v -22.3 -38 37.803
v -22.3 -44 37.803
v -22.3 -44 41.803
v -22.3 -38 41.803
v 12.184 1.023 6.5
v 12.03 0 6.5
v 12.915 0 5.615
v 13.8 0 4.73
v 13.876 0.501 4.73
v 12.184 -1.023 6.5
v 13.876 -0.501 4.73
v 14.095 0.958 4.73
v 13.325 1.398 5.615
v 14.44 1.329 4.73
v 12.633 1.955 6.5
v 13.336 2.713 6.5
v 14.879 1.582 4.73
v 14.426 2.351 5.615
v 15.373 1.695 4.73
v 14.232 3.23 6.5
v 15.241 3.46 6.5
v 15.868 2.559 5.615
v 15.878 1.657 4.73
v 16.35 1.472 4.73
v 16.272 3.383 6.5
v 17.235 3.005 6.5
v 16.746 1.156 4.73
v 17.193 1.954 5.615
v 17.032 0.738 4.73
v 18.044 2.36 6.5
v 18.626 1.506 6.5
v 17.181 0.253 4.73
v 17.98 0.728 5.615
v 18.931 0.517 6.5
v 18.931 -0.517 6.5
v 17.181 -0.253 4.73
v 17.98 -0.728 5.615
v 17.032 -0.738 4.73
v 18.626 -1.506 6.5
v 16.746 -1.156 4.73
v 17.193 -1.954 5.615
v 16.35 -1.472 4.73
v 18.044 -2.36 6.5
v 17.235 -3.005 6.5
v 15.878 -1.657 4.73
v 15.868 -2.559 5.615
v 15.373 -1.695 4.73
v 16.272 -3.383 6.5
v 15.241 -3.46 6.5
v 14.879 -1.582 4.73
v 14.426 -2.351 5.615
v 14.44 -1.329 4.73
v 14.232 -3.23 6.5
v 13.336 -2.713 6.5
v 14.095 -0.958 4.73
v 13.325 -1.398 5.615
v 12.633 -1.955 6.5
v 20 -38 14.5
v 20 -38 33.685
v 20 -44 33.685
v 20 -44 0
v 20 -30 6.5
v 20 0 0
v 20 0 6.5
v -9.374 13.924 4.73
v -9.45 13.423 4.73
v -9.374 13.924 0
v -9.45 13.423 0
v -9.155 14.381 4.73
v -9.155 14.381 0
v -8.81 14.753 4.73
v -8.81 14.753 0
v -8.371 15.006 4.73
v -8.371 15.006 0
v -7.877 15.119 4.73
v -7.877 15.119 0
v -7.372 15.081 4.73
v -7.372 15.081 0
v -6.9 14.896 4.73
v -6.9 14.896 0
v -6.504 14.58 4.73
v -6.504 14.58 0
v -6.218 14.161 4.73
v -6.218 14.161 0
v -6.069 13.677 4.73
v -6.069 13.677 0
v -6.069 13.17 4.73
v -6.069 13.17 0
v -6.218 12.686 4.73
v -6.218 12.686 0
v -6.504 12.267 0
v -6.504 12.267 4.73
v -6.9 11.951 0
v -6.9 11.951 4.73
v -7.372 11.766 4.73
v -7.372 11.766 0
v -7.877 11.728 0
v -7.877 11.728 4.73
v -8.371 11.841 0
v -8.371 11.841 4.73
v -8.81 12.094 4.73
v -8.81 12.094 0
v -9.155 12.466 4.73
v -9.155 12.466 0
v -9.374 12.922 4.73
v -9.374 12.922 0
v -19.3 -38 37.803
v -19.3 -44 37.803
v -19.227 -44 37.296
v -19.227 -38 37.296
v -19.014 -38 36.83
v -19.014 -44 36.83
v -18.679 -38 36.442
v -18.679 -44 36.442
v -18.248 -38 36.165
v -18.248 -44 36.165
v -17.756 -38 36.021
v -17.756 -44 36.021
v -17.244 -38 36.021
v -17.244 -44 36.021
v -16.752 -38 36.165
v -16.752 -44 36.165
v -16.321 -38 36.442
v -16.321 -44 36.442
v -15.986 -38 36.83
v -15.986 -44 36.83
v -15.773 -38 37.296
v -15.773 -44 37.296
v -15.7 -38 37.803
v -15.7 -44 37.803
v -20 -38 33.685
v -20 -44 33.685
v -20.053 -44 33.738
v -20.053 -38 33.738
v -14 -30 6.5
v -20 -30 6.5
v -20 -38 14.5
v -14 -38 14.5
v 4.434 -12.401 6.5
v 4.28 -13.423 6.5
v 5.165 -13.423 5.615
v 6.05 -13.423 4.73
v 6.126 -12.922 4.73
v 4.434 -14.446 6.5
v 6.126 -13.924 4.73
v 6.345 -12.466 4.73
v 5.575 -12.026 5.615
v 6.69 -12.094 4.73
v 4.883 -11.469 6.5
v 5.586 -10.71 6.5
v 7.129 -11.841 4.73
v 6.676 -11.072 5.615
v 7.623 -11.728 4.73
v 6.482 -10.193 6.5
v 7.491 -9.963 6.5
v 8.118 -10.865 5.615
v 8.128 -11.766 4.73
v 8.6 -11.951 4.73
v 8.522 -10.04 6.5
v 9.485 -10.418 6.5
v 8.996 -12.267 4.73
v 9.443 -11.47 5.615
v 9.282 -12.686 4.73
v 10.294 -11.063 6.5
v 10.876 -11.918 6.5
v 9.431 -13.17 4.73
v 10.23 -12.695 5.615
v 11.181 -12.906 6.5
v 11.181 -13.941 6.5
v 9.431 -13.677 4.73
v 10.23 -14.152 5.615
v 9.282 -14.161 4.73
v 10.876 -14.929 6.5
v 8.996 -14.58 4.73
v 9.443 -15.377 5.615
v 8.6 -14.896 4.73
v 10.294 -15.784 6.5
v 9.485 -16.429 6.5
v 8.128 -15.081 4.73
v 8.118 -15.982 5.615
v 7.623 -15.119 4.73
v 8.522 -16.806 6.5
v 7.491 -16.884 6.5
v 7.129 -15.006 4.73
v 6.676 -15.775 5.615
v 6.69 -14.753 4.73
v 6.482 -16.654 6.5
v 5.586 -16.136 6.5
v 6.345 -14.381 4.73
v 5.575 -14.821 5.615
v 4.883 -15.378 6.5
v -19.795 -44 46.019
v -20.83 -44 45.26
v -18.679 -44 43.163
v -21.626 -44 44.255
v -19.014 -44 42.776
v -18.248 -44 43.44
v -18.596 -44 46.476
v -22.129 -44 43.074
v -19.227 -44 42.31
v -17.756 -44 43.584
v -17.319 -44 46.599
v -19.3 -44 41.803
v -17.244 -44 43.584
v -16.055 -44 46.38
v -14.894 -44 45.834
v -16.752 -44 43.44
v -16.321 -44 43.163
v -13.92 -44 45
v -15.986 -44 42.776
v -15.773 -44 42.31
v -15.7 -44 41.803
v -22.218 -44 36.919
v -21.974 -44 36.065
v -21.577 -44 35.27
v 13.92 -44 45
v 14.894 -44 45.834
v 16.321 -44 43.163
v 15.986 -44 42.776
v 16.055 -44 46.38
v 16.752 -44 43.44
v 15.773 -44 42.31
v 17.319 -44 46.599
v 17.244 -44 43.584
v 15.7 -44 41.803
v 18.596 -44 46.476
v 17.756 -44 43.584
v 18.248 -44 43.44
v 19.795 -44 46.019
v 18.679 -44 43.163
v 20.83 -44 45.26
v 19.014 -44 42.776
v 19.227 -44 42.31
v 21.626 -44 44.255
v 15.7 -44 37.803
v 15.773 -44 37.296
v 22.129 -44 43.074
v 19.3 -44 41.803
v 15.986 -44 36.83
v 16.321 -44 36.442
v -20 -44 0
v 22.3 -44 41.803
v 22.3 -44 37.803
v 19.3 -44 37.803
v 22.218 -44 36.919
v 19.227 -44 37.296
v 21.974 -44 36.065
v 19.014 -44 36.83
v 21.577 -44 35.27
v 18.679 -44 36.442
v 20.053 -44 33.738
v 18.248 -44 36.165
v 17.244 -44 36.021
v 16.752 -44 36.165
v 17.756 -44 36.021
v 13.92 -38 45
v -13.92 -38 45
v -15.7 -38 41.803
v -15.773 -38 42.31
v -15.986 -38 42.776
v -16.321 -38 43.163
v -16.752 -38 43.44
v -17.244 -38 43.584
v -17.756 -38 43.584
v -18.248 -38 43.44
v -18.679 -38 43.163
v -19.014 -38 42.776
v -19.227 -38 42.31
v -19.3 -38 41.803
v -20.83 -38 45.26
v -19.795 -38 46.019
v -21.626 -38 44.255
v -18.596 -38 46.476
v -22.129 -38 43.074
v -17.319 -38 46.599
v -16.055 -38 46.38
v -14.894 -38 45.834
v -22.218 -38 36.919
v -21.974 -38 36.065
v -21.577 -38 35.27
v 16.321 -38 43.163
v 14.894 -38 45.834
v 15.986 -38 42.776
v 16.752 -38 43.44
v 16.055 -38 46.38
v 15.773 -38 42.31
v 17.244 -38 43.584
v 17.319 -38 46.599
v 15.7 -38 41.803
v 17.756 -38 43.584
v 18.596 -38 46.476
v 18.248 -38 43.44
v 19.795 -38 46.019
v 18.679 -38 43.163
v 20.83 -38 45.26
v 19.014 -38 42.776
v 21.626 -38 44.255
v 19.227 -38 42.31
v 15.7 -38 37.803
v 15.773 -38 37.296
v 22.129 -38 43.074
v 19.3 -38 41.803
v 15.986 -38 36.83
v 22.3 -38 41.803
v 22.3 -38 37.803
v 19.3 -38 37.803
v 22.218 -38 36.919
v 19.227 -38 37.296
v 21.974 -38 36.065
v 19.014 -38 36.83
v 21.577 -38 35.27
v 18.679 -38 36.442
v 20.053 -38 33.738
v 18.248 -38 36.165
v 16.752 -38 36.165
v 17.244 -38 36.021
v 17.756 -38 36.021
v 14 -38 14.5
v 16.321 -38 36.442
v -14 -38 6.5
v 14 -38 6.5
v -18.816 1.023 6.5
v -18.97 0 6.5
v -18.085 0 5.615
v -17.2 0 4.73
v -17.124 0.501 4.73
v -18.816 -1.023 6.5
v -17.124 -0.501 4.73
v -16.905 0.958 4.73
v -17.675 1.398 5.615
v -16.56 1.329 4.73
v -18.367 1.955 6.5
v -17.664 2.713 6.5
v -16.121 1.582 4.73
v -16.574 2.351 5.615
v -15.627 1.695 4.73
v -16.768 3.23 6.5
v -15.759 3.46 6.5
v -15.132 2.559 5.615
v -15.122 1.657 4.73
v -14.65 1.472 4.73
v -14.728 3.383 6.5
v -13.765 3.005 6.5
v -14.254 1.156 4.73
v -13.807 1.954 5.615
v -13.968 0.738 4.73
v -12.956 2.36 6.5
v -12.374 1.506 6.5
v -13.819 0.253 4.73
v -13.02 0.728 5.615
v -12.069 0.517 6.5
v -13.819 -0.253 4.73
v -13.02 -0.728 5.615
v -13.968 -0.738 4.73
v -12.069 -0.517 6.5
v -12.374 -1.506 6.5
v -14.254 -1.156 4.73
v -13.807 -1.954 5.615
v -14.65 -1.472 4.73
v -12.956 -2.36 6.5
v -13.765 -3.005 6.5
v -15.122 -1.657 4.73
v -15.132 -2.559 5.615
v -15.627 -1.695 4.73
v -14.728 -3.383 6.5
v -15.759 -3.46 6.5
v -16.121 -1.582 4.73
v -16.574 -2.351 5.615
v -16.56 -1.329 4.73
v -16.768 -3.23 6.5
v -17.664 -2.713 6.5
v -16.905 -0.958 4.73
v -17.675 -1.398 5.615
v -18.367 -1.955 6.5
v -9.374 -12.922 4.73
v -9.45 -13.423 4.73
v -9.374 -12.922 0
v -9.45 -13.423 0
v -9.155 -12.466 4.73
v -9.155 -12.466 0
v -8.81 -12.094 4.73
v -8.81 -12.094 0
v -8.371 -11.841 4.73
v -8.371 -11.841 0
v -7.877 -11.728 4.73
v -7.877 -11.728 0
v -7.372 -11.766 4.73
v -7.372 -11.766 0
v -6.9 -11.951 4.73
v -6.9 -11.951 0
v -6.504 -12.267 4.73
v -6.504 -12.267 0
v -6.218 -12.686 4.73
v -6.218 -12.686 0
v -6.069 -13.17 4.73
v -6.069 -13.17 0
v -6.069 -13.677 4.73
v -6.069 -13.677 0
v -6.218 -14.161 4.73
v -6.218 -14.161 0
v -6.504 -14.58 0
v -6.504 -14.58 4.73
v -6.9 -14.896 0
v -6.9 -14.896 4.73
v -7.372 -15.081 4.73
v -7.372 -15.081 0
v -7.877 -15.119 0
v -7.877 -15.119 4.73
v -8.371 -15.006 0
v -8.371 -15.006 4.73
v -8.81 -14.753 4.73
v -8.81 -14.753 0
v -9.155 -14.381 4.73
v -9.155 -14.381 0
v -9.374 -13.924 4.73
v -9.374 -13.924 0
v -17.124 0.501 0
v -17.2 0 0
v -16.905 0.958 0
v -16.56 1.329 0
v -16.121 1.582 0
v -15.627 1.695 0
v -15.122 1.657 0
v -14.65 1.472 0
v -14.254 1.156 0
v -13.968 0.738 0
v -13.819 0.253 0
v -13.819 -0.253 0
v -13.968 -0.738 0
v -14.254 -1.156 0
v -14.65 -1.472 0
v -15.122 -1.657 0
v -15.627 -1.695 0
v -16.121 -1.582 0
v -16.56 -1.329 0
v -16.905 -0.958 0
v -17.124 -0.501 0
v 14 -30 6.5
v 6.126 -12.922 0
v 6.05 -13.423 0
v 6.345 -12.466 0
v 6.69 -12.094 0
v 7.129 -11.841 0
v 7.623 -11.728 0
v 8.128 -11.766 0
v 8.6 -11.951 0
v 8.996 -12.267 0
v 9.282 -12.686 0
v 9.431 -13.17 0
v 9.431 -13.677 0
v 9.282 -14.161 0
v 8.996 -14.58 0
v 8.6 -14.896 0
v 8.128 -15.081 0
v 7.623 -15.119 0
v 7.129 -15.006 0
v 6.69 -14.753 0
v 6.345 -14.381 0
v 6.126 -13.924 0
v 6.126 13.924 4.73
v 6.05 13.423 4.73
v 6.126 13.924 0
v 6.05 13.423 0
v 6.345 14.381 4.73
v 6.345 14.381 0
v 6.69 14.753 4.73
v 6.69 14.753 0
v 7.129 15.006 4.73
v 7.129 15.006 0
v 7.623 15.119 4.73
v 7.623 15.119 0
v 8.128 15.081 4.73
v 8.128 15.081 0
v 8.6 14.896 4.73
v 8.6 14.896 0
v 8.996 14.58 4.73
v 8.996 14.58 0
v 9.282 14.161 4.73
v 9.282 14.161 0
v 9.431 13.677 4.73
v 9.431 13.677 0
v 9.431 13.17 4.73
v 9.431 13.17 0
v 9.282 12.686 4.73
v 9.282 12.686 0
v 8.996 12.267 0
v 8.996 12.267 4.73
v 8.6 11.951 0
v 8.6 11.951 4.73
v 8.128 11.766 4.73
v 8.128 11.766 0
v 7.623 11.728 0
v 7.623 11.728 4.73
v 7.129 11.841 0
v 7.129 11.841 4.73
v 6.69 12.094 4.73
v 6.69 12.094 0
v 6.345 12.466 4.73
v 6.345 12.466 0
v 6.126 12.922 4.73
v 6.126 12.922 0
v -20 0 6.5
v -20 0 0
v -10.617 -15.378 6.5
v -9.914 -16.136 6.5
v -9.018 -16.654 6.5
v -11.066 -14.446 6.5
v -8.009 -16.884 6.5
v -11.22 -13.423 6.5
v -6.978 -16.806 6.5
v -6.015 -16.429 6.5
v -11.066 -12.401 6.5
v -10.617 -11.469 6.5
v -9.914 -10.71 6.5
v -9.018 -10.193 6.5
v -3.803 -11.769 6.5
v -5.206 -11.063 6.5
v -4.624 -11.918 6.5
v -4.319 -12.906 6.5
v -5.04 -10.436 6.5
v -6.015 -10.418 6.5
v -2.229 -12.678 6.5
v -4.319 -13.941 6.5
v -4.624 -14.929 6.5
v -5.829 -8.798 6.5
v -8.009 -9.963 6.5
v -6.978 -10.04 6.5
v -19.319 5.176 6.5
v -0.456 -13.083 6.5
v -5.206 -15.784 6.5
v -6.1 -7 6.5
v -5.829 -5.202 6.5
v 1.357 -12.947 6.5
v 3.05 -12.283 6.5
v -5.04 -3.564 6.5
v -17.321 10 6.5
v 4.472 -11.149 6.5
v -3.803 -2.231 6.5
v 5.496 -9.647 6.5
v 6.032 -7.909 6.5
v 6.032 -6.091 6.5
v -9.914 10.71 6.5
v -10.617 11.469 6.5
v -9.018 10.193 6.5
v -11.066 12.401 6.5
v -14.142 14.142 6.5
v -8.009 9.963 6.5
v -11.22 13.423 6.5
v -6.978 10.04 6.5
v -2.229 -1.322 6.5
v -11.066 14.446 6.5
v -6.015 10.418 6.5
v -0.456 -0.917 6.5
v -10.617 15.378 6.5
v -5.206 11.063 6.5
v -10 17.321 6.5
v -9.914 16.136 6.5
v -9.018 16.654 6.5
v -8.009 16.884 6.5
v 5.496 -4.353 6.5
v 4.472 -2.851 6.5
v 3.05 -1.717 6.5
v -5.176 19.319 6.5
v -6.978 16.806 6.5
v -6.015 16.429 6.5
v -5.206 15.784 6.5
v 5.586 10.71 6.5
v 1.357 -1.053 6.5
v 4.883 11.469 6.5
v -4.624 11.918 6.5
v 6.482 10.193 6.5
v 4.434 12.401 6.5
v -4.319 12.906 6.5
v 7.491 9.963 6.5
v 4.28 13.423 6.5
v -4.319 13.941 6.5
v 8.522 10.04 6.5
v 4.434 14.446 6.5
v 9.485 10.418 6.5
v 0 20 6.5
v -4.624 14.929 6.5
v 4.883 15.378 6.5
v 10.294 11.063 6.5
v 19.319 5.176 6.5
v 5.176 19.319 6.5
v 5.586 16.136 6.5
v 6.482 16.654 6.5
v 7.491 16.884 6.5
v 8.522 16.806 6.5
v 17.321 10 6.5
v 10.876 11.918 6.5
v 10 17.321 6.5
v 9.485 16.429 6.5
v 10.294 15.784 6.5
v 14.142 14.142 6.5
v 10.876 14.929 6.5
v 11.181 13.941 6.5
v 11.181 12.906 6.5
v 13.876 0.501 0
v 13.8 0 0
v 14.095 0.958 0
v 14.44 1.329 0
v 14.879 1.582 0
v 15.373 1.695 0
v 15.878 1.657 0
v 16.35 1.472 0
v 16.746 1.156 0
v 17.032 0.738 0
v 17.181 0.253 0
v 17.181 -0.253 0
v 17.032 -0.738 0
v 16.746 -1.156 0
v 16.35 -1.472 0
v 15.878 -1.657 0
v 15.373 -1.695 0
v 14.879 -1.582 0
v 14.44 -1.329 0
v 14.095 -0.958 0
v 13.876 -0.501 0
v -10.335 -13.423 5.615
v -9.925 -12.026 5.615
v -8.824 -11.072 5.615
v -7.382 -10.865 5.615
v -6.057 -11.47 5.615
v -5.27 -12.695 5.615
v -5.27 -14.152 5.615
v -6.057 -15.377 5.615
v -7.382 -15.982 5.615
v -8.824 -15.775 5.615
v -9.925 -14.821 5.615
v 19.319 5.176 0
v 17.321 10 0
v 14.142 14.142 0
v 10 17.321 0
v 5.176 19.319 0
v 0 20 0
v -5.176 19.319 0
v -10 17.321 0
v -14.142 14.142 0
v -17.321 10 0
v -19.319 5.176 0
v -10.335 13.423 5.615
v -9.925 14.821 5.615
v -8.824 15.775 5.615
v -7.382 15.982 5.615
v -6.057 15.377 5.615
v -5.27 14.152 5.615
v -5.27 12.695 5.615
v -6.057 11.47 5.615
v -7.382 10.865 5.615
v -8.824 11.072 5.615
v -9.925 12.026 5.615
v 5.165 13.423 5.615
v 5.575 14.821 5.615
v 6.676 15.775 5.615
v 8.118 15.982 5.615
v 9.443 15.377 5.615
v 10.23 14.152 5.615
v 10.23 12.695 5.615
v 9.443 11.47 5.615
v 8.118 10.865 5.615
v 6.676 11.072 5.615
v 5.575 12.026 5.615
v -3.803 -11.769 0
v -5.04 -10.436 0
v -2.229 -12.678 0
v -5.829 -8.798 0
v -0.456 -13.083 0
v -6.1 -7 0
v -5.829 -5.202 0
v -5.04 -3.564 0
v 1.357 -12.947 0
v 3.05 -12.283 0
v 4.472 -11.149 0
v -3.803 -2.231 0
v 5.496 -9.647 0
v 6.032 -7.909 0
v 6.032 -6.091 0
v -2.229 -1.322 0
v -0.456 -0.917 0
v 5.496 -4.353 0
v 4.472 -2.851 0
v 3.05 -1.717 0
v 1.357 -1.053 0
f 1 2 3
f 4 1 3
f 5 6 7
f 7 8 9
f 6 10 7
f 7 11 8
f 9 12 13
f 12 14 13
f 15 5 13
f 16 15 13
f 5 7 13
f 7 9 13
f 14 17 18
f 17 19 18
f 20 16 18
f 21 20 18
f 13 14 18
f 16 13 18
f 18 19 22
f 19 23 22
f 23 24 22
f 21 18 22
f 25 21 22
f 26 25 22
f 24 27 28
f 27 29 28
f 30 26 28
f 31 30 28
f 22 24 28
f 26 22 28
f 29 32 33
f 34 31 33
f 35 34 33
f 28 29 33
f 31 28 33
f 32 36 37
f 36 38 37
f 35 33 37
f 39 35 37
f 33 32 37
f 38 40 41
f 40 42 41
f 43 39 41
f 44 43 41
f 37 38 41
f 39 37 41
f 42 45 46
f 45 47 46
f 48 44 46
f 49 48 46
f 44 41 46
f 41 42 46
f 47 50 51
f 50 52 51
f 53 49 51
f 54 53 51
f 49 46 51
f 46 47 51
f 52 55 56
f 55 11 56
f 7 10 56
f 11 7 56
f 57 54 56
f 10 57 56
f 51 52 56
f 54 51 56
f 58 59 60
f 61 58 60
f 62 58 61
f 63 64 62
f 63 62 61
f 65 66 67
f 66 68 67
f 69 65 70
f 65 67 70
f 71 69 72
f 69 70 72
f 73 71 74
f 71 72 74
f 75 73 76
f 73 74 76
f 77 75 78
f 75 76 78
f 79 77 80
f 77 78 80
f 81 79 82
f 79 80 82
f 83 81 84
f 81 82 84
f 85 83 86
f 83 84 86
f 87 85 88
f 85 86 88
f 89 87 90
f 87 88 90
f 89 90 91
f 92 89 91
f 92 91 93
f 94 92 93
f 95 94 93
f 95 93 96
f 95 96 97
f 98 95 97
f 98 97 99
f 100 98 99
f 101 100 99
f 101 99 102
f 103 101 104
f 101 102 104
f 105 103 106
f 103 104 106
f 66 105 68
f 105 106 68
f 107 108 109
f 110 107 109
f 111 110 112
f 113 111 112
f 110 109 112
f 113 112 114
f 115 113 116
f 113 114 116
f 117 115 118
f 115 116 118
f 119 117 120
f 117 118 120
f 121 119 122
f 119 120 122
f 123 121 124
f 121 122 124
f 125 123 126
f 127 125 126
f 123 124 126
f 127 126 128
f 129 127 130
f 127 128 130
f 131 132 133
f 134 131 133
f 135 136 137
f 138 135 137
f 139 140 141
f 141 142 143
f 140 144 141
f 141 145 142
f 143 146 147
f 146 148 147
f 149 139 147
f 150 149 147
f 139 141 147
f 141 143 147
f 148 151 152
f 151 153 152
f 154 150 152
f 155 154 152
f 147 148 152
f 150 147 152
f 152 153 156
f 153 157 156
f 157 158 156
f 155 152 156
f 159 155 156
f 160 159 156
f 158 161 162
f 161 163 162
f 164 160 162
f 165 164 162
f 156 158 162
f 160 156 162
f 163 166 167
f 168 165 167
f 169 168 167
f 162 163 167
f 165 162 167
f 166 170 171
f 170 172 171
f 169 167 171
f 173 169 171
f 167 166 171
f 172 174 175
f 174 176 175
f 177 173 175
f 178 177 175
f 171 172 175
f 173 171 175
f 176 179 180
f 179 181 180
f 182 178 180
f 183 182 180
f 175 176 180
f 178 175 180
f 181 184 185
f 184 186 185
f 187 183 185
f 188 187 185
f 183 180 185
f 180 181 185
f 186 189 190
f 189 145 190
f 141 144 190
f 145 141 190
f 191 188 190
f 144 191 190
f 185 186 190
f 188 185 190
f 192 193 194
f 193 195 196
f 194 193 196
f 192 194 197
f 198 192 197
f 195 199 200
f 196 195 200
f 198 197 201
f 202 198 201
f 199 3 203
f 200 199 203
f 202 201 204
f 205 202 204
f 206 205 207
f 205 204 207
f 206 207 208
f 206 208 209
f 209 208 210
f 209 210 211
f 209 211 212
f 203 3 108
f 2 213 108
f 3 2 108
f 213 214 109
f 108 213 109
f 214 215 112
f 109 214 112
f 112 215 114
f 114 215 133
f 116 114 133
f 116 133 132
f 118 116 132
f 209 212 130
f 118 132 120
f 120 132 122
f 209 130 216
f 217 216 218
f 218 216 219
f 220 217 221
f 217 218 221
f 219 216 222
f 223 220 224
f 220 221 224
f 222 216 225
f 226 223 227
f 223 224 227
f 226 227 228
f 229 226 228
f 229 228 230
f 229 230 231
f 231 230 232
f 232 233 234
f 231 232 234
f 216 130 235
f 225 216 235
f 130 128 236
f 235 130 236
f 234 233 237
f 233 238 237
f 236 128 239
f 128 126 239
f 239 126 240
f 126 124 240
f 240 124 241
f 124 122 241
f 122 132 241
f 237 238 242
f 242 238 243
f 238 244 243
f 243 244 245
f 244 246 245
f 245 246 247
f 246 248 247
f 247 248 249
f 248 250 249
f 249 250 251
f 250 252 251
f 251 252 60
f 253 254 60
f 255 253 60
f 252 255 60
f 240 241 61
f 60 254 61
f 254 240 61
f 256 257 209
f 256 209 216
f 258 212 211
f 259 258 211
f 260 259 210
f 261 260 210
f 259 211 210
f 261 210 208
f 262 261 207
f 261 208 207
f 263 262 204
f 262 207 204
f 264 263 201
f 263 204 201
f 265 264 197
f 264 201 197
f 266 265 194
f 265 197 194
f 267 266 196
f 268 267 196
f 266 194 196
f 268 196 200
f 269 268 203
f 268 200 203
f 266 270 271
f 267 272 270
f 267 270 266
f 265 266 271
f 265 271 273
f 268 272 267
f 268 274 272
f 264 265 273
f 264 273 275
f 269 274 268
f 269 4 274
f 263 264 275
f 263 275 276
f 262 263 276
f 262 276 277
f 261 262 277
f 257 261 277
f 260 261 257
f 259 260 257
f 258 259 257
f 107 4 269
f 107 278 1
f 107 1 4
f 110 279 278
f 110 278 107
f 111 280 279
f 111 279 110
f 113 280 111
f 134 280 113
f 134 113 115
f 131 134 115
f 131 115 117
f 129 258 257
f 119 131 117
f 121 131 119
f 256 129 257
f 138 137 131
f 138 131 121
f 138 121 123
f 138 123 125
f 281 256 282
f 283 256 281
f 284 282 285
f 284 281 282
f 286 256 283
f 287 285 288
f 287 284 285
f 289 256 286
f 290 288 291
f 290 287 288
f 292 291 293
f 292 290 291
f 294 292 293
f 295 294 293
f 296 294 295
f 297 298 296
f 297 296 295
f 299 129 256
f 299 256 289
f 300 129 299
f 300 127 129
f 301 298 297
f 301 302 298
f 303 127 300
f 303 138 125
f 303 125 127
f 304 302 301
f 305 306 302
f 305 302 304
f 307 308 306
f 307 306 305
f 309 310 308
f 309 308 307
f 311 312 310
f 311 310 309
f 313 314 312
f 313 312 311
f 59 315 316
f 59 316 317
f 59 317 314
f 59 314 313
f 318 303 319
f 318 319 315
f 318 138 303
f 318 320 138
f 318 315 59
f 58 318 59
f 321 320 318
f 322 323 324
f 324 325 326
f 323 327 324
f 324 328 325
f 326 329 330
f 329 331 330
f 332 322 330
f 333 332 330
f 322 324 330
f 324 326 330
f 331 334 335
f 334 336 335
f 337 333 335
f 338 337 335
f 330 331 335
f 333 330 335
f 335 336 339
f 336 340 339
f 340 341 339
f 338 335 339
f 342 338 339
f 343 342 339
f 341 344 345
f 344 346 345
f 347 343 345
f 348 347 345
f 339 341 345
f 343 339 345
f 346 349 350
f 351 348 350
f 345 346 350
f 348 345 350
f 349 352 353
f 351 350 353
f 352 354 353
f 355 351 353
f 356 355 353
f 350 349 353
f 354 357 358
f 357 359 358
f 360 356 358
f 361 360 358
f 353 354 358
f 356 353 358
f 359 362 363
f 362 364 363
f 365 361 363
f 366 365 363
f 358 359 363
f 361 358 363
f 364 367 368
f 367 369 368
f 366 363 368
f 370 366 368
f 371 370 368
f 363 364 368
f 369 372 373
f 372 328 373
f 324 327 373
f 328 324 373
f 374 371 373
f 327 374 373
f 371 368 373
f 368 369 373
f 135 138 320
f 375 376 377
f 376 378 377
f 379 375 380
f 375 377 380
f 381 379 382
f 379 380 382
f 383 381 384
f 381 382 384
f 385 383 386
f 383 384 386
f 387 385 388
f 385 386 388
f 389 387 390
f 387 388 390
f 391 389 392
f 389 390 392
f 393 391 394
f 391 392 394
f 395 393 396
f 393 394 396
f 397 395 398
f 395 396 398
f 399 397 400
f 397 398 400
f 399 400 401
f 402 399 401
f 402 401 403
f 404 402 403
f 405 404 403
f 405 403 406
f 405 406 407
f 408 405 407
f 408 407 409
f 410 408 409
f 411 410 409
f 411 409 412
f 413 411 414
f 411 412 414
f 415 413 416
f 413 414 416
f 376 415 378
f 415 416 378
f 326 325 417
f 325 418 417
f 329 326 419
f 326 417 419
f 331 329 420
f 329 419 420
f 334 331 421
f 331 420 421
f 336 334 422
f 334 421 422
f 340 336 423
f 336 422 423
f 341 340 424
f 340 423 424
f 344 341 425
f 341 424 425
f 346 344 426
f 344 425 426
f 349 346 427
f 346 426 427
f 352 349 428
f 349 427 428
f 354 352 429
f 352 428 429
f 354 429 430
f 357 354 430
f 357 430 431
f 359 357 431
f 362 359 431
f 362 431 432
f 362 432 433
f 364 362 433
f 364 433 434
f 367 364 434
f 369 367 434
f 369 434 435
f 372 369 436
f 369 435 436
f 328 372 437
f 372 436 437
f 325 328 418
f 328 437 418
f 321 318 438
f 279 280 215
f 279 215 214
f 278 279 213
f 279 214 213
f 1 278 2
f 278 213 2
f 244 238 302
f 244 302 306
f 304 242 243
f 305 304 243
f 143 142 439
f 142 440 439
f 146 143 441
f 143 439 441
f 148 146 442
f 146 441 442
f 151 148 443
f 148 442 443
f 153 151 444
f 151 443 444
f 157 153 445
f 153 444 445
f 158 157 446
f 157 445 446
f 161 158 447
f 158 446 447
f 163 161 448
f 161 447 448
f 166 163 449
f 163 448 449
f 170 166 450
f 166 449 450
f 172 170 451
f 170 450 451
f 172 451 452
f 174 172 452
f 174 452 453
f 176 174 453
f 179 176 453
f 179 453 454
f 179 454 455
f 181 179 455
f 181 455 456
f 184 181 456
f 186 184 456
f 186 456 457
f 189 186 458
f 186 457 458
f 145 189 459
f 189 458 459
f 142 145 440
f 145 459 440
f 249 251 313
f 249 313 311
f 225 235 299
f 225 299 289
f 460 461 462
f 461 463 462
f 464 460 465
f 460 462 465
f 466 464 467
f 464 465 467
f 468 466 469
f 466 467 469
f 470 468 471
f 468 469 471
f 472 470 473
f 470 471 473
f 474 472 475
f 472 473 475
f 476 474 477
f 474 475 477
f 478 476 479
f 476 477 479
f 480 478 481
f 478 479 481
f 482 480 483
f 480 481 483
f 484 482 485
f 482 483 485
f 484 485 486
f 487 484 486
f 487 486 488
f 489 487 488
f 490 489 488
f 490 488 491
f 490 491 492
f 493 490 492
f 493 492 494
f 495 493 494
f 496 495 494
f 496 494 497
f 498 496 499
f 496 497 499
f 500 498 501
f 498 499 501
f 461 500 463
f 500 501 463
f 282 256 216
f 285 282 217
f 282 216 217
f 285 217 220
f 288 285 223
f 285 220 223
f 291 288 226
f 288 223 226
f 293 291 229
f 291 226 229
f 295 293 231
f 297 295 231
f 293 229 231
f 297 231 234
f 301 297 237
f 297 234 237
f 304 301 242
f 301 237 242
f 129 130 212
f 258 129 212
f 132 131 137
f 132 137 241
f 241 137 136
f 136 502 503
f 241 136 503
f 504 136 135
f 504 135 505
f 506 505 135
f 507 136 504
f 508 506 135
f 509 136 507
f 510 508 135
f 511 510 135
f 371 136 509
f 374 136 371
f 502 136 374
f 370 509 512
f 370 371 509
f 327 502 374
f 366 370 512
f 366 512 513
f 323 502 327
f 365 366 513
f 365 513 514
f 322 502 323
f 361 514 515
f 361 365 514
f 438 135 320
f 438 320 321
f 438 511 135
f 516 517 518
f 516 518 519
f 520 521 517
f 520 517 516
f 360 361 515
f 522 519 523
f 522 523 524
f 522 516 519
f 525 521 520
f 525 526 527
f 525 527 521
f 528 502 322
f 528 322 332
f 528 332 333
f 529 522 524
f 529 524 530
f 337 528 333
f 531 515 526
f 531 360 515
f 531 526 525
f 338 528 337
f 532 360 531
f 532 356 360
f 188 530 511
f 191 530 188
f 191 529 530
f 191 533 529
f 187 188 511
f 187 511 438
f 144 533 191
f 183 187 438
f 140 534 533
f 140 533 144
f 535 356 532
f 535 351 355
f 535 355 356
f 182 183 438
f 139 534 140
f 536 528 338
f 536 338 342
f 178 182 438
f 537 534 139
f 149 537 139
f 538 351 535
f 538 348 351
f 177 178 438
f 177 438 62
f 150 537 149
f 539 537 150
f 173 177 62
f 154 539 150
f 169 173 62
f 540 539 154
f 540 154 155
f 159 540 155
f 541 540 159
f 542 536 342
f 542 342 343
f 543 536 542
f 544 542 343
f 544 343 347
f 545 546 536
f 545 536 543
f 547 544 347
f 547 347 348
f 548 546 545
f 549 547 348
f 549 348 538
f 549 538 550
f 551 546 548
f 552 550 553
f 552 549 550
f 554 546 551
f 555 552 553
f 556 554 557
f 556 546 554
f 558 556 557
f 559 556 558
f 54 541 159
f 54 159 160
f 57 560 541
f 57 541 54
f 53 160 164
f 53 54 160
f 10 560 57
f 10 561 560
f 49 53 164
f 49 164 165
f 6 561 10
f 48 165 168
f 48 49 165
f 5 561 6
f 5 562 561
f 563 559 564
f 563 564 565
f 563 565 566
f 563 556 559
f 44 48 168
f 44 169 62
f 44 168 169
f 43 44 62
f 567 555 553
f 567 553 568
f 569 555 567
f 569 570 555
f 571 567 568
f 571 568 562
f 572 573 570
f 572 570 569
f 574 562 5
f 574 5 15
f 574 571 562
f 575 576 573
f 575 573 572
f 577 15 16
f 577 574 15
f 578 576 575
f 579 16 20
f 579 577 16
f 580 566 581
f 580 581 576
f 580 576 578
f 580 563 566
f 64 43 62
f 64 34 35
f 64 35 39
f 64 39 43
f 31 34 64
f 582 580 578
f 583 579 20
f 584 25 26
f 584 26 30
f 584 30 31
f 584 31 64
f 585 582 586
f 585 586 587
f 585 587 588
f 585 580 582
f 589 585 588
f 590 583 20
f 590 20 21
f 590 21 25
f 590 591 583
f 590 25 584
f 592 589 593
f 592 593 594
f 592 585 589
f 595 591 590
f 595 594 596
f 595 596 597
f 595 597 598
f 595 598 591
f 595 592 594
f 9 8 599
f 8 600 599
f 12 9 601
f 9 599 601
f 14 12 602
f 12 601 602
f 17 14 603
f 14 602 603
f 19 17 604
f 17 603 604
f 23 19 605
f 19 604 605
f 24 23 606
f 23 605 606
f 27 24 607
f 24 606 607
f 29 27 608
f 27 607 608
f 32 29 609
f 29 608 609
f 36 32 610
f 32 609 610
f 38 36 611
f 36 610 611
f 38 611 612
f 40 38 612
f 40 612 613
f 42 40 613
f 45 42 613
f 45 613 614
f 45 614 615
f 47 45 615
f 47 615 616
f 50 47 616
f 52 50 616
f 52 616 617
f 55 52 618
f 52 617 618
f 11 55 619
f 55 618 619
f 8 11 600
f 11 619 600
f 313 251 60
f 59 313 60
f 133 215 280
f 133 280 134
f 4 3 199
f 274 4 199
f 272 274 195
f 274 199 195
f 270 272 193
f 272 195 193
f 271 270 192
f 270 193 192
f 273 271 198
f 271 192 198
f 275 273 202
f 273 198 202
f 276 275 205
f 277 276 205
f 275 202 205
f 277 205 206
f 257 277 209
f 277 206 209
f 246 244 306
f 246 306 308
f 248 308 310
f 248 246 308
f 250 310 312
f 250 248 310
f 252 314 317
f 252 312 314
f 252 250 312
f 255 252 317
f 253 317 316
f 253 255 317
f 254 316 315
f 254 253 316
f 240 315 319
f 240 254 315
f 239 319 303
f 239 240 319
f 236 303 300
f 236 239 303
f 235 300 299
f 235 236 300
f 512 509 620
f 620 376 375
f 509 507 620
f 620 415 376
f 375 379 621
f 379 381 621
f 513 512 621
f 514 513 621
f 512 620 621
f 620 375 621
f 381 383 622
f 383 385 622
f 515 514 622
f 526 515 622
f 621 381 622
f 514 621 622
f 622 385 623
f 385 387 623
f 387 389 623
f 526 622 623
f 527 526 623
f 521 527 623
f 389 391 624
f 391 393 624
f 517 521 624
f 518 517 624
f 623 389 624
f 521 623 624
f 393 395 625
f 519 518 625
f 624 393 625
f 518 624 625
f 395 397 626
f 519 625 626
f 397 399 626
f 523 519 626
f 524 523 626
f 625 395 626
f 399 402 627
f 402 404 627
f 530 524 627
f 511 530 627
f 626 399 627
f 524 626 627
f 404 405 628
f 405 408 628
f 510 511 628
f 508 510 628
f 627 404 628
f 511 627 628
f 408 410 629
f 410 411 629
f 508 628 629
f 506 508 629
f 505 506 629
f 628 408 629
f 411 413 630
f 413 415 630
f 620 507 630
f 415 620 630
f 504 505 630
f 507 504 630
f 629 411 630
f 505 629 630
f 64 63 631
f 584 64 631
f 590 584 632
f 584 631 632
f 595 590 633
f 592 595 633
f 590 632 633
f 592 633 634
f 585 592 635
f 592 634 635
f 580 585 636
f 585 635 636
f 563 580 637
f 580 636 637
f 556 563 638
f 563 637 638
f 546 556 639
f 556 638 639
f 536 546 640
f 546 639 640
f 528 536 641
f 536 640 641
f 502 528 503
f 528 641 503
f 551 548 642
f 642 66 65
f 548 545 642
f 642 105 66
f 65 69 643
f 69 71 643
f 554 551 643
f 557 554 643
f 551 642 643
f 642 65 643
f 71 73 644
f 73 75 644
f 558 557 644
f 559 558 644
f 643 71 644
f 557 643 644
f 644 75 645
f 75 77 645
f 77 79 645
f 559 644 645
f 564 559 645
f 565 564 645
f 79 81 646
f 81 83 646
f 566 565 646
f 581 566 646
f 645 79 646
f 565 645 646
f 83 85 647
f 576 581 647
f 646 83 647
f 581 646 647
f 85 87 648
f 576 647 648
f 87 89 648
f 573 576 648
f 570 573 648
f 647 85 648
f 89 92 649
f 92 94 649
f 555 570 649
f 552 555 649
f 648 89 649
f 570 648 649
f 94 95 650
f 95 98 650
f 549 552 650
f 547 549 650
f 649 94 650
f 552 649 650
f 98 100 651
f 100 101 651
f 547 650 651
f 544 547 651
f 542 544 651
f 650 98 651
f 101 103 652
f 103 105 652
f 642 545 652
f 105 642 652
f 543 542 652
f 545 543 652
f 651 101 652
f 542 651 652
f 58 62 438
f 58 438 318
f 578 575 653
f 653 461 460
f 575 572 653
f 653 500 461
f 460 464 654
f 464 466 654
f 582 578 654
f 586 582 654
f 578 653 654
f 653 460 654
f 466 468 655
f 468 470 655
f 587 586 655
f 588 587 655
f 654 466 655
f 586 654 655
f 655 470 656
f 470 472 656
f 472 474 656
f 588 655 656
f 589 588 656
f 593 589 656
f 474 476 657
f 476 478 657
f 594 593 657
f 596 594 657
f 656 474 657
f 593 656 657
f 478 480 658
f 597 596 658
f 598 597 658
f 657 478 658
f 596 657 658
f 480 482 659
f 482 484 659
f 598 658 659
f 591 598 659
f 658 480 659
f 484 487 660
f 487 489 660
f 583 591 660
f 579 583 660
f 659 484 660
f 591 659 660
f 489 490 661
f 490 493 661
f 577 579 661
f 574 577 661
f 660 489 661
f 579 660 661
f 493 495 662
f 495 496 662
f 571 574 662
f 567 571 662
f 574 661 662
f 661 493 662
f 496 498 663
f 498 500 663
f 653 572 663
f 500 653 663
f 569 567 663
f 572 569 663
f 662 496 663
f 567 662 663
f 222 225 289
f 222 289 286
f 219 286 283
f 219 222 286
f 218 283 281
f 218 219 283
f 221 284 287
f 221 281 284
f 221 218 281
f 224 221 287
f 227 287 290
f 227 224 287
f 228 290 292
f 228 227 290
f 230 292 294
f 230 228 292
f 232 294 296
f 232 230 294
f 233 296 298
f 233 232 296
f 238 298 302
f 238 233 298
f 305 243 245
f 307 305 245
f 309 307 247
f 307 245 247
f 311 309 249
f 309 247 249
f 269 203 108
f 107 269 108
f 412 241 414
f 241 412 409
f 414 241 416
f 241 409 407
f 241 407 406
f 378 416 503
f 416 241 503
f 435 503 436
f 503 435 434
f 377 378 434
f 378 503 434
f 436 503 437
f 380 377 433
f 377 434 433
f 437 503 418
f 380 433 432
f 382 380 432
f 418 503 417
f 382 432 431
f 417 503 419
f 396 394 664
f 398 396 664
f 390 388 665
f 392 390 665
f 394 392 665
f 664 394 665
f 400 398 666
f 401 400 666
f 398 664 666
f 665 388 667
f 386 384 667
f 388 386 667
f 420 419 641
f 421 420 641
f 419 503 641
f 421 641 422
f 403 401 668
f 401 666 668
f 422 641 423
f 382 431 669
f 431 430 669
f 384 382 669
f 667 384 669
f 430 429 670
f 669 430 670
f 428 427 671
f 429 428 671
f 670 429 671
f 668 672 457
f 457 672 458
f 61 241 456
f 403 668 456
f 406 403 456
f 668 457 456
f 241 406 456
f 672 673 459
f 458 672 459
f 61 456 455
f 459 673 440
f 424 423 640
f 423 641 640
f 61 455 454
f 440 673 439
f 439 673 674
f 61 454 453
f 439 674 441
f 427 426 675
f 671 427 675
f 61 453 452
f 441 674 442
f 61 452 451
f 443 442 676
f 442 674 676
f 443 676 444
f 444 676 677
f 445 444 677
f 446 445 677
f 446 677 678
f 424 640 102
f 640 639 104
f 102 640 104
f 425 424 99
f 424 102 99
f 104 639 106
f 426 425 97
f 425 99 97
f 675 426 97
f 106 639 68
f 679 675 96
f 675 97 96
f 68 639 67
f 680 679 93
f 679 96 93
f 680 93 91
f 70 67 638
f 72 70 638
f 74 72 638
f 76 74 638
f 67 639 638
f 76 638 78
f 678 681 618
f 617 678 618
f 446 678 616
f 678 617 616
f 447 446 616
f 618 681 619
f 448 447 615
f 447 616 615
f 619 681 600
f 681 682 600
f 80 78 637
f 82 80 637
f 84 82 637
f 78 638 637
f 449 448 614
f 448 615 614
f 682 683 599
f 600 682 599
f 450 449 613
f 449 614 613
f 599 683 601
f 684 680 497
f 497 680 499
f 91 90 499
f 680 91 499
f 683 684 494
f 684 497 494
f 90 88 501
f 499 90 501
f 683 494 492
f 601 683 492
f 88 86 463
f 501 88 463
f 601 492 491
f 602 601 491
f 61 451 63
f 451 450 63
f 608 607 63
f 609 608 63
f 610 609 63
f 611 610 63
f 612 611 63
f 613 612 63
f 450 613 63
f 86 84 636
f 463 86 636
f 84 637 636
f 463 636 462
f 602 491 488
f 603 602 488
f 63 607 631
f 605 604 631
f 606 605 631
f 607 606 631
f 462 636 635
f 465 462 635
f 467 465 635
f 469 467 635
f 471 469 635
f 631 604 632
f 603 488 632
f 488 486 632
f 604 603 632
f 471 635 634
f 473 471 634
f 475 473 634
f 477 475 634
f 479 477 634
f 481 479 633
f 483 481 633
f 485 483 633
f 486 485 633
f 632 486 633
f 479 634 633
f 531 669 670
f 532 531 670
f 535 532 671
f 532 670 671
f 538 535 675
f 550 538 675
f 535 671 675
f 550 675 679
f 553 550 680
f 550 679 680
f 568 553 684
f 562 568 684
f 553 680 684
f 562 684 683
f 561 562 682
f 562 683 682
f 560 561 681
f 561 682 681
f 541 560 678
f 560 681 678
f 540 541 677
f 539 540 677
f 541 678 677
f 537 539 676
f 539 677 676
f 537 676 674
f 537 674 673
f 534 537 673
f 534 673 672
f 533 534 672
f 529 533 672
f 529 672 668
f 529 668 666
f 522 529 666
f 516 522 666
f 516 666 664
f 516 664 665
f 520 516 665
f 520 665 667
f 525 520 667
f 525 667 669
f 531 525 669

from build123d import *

# Parameters (mm, degrees)
SKETCH1_R                                            = 20
BOSS_EXTRUDE1_DEPTH                                  = 6.5
CSK_FOR_M3_HEX_SOCKET_COUNTERSUNK_HEAD_S_D           = 3.4
CSK_FOR_M3_HEX_SOCKET_COUNTERSUNK_HEAD_S_CSINK_D     = 6.94
CSK_FOR_M3_HEX_SOCKET_COUNTERSUNK_HEAD_S_CSINK_ANGLE = 90
F_12_2_12_2_DIAMETER_HOLE1_D                         = 12.2
BOSS_EXTRUDE2_START                                  = -6.5
BOSS_EXTRUDE2_DEPTH                                  = 6.5
SKETCH7_W                                            = 40
SKETCH7_H                                            = 45
BOSS_EXTRUDE3_DEPTH                                  = 6
M3_CLEARANCE_HOLE2_D                                 = 3.6
CUT_EXTRUDE1_DEPTH                                   = 77.085478247
CUT_EXTRUDE1_DEPTH_BACK                              = 77.085478247
BOSS_EXTRUDE4_DEPTH                                  = 6
CHAMFER1_START                                       = -45
CHAMFER1_DEPTH                                       = 8
CHAMFER1_START_2                                     = -44
CHAMFER1_2_DEPTH                                     = 6
BOSS_EXTRUDE5_DEPTH                                  = 6
BOSS_EXTRUDE6_START                                  = -40
BOSS_EXTRUDE6_DEPTH                                  = 6


with BuildPart() as part:
    # Sketch1 → Boss-Extrude1 (new body)
    with BuildSketch(Plane.XY):
        with Locations(Location((0, 0, 0), (0, 0, 180))):
            Circle(SKETCH1_R)
    extrude(amount=BOSS_EXTRUDE1_DEPTH)

    # CSK for M3 Hex Socket Countersunk Head Screw1 (through all)
    with Locations(Plane.XY.offset(6.5)):
        with Locations((-7.75, -13.423393759), (-15.5, 0), (-7.75, 13.423393759), (7.75, 13.423393759), (15.5, 0), (7.75, -13.423393759)):
            CounterSinkHole(CSK_FOR_M3_HEX_SOCKET_COUNTERSUNK_HEAD_S_D / 2, CSK_FOR_M3_HEX_SOCKET_COUNTERSUNK_HEAD_S_CSINK_D / 2, counter_sink_angle=CSK_FOR_M3_HEX_SOCKET_COUNTERSUNK_HEAD_S_CSINK_ANGLE)

    # Ø12.2 (12.2) Diameter Hole1 (through all)
    with Locations(Plane.XY.offset(6.5)):
        with Locations((0, -7)):
            Hole(F_12_2_12_2_DIAMETER_HOLE1_D / 2)

    # Sketch6 → Boss-Extrude2 (add)
    with BuildSketch(Plane.XY.offset(6.5).offset(BOSS_EXTRUDE2_START)):
        with BuildLine():
            Line((-20, 0), (-20, -38))
            Line((-20, -38), (20, -38))
            Line((20, -38), (20, 0))
            ThreePointArc((20, 0), (0, -20), (-20, 0))
        make_face()
    extrude(amount=BOSS_EXTRUDE2_DEPTH)

    # Sketch7 → Boss-Extrude3 (add)
    with BuildSketch(Plane.XZ.offset(38)):
        with Locations((0, 22.5)):
            Rectangle(SKETCH7_W, SKETCH7_H)
    extrude(amount=BOSS_EXTRUDE3_DEPTH)

    # M3 Clearance Hole2 (through all)
    with Locations(Plane(origin=(0, -44, 0), x_dir=(-1, 0, 0), z_dir=(0, -1, 0))):
        with Locations((-17.5, -39.802814471), (17.5, -39.802814471)):
            Hole(M3_CLEARANCE_HOLE2_D / 2)

    # Sketch11 → Cut-Extrude1 (cut, two sides: drawn at the far end of the back side and taken through both)
    with BuildSketch(Plane(origin=(0, -38, 0), x_dir=(1, 0, 0), z_dir=(0, 1, 0)).offset(-CUT_EXTRUDE1_DEPTH_BACK)):
        with BuildLine():
            Line((-15.7, -37.802814471), (-15.7, -41.802814471))
            ThreePointArc((-15.7, -41.802814471), (-17.5, -43.602814471), (-19.3, -41.802814471))
            Line((-19.3, -41.802814471), (-19.3, -37.802814471))
            ThreePointArc((-19.3, -37.802814471), (-17.5, -36.002814471), (-15.7, -37.802814471))
        make_face()
        with BuildLine():
            Line((15.7, -37.802814471), (15.7, -41.802814471))
            ThreePointArc((15.7, -41.802814471), (17.5, -43.602814471), (19.3, -41.802814471))
            Line((19.3, -41.802814471), (19.3, -37.802814471))
            ThreePointArc((19.3, -37.802814471), (17.5, -36.002814471), (15.7, -37.802814471))
        make_face()
    extrude(amount=CUT_EXTRUDE1_DEPTH + CUT_EXTRUDE1_DEPTH_BACK, mode=Mode.SUBTRACT)

    # Sketch10 → Boss-Extrude4 (add)
    # profile 1 of 2: a face of its own
    with BuildSketch(Plane.XZ.offset(44)):
        with BuildLine():
            Line((-22.3, 37.802814471), (-22.3, 41.802814471))
            ThreePointArc((-22.3, 41.802814471), (-17.5, 46.602814471), (-12.7, 41.802814471))
            Line((-12.7, 41.802814471), (-12.7, 37.802814471))
            ThreePointArc((-12.7, 37.802814471), (-17.5, 33.002814471), (-22.3, 37.802814471))
        make_face()
        with BuildLine():
            Line((-19.3, 37.802814471), (-19.3, 41.802814471))
            ThreePointArc((-19.3, 41.802814471), (-17.5, 43.602814471), (-15.7, 41.802814471))
            Line((-15.7, 41.802814471), (-15.7, 37.802814471))
            ThreePointArc((-15.7, 37.802814471), (-17.5, 36.002814471), (-19.3, 37.802814471))
        make_face(mode=Mode.SUBTRACT)
    # profile 2 of 2: a face of its own
    with BuildSketch(Plane.XZ.offset(44)):
        with BuildLine():
            Line((22.3, 41.802814471), (22.3, 37.802814471))
            ThreePointArc((22.3, 37.802814471), (17.5, 33.002814471), (12.7, 37.802814471))
            Line((12.7, 37.802814471), (12.7, 41.802814471))
            ThreePointArc((12.7, 41.802814471), (17.5, 46.602814471), (22.3, 41.802814471))
        make_face()
        with BuildLine():
            Line((19.3, 41.802814471), (19.3, 37.802814471))
            ThreePointArc((19.3, 37.802814471), (17.5, 36.002814471), (15.7, 37.802814471))
            Line((15.7, 37.802814471), (15.7, 41.802814471))
            ThreePointArc((15.7, 41.802814471), (17.5, 43.602814471), (19.3, 41.802814471))
        make_face(mode=Mode.SUBTRACT)
    extrude(amount=-BOSS_EXTRUDE4_DEPTH)

    # Chamfer1: read off the stored shape, not the designer's step
    # Chamfer1 outline → Chamfer1 (cut)
    with BuildSketch(Plane(origin=(0, 0, 0), x_dir=(1, 0, 0), z_dir=(0, 1, 0)).offset(CHAMFER1_START)):
        with BuildLine():
            Line((20.05286265, -33.7379784), (21.57746495, -35.270171666))
            ThreePointArc((21.57746495, -35.270171666), (20.902530686, -34.417140989), (20.05286265, -33.7379784))
        make_face()
        with BuildLine():
            ThreePointArc((-20.05286265, -33.7379784), (-20.902530686, -34.417140989), (-21.57746495, -35.270171666))
            Line((-21.57746495, -35.270171666), (-20.05286265, -33.7379784))
        make_face()
    extrude(amount=CHAMFER1_DEPTH, mode=Mode.SUBTRACT)

    # Chamfer1 2 outline → Chamfer1 2 (add)
    with BuildSketch(Plane(origin=(0, 0, 0), x_dir=(1, 0, 0), z_dir=(0, 1, 0)).offset(CHAMFER1_START_2)):
        with BuildLine():
            ThreePointArc((20, -33.705254222), (20.026484308, -33.721530722), (20.05286265, -33.7379784))
            Line((20.05286265, -33.7379784), (20, -33.684852548))
            Line((20, -33.684852548), (20, -33.705254222))
        make_face()
        with BuildLine():
            Line((-20, -33.684852548), (-20.05286265, -33.7379784))
            ThreePointArc((-20.05286265, -33.7379784), (-20.026484308, -33.721530722), (-20, -33.705254222))
            Line((-20, -33.705254222), (-20, -33.684852548))
        make_face()
    extrude(amount=CHAMFER1_2_DEPTH)

    # Sketch12 → Boss-Extrude5 (add)
    with BuildSketch(Plane(origin=(20, 0, 0), x_dir=(0, 0, -1), z_dir=(1, 0, 0))):
        Polygon((-6.5, -30), (-14.5, -38), (-6.5, -38), align=None)
    extrude(amount=-BOSS_EXTRUDE5_DEPTH)

    # Sketch12<2> → Boss-Extrude6 (add)
    with BuildSketch(Plane(origin=(20, 0, 0), x_dir=(0, 0, -1), z_dir=(1, 0, 0)).offset(BOSS_EXTRUDE6_START)):
        Polygon((-6.5, -30), (-14.5, -38), (-6.5, -38), align=None)
    extrude(amount=BOSS_EXTRUDE6_DEPTH)


solid = part.part
